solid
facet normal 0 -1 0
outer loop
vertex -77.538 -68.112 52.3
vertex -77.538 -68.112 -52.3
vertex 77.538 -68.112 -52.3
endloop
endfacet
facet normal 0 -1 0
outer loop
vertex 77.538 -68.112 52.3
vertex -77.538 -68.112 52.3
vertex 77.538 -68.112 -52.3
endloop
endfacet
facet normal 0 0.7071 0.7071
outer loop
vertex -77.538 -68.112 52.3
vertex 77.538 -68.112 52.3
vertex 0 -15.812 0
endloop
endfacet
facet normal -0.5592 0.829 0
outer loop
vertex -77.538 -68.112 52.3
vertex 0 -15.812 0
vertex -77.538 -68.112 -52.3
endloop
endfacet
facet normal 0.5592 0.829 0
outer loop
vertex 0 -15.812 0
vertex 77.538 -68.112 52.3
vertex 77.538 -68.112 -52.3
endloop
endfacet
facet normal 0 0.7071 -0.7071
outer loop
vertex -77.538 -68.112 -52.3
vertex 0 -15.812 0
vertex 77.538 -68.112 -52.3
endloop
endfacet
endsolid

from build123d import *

# Parameters (mm, degrees)
AUFSATZ_LINEAR_START            = -68.111592
SKIZZE5_W                       = 2000
SKIZZE5_H                       = 1500
AUFSATZ_LINEAR_AUSTRAGEN1_DEPTH = 63.5
HORIZONTAL_DEPTH                = 1501
VERTIKAL_DEPTH                  = 78.537939311
VERTIKAL_DEPTH_BACK             = 78.537939311


with BuildPart() as part:
    # Skizze5 → Aufsatz-Linear austragen1 (new body)
    with BuildSketch(Plane(origin=(0, 0, 0), x_dir=(1, 0, 0), z_dir=(0, 1, 0)).offset(AUFSATZ_LINEAR_START)):
        Rectangle(SKIZZE5_W, SKIZZE5_H)
    extrude(amount=AUFSATZ_LINEAR_AUSTRAGEN1_DEPTH)

    # Skizze6 → Horizontal (cut, through all)
    with BuildSketch(Plane.XY.offset(750)):
        Polygon((0, -15.811591556), (-1000, -690.320108399), (-1000, -3.611591556), (1000, -3.611591556), (1000, -690.320108399), align=None)
    extrude(amount=-HORIZONTAL_DEPTH, mode=Mode.SUBTRACT)

    # Skizze7 → Vertikal (cut, two sides)
    with BuildSketch(Plane.ZY) as vertikal_sk:
        Polygon((0, -15.811591556), (-750, -765.811591556), (-750, -14.811591556), (750, -14.811591556), (750, -765.811591556), align=None)
    extrude(amount=VERTIKAL_DEPTH, mode=Mode.SUBTRACT)
    extrude(vertikal_sk.sketch, amount=-VERTIKAL_DEPTH_BACK, mode=Mode.SUBTRACT)


solid = part.part
